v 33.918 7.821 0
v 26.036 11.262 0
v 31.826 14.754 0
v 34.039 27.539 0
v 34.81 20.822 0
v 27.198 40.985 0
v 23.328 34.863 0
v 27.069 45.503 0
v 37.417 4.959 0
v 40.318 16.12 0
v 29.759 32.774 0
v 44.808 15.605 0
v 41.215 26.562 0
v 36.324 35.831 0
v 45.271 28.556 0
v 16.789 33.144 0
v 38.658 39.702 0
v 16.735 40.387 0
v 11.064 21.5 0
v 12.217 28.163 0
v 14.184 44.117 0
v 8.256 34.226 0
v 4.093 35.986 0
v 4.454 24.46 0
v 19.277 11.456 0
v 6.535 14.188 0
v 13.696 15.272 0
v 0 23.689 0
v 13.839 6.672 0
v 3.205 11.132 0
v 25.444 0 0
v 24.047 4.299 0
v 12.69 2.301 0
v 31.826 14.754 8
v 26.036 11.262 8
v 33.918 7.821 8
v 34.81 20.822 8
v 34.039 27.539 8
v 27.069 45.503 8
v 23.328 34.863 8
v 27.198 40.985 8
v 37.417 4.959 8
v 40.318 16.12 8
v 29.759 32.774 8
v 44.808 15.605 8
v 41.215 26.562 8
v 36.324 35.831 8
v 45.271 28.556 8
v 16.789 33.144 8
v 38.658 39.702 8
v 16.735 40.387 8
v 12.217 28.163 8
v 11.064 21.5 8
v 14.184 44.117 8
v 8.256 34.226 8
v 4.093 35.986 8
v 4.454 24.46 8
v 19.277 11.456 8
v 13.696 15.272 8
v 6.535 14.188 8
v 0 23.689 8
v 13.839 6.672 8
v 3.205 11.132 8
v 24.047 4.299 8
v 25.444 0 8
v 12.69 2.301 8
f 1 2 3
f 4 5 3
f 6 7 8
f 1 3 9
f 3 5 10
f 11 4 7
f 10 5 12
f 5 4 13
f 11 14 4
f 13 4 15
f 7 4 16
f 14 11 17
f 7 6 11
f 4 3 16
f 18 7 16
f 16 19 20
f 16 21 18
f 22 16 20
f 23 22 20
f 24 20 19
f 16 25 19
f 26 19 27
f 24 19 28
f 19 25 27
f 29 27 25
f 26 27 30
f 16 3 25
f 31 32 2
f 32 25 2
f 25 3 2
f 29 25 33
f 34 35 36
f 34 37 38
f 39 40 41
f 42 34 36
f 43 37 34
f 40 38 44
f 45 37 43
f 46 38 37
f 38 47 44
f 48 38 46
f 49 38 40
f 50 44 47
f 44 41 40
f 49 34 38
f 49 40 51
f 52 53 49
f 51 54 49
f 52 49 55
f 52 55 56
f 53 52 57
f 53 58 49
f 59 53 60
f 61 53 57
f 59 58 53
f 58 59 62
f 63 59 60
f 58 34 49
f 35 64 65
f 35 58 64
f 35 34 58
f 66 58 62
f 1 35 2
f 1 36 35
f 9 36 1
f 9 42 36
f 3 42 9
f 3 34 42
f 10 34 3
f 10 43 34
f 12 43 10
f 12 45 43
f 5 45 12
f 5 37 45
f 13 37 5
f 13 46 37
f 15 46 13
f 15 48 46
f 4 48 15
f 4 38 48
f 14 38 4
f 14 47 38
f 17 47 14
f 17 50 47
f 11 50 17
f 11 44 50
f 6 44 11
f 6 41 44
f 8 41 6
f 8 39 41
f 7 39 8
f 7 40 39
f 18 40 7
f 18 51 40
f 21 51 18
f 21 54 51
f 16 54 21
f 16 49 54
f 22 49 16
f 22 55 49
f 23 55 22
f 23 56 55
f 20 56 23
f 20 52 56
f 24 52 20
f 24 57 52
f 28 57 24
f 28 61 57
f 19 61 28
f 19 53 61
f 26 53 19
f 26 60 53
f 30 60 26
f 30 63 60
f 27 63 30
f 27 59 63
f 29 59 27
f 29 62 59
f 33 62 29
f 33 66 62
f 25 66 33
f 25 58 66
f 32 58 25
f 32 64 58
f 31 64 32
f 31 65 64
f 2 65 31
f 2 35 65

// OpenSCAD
$fn = 32;

// ----------------------------------------------------------------------
// Fan rotor section: 11 blades, 12 mm hub radius, 11 mm blades
// ----------------------------------------------------------------------

// --- parameters (mm) ---
profile_height = 8;       // extrusion height
profile_points = 33;      // points of the closed outline

profile = [[34.81, 20.822], [41.215, 26.562], [45.271, 28.556], [34.039, 27.539], [36.324, 35.831], [38.658, 39.702], [29.759, 32.774], [27.198, 40.985], [27.069, 45.503], [23.328, 34.863], [16.735, 40.387], [14.184, 44.117], [16.789, 33.144], [8.256, 34.226], [4.093, 35.986], [12.217, 28.163], [4.454, 24.46], [0, 23.689], [11.064, 21.5], [6.535, 14.188], [3.205, 11.132], [13.696, 15.272], [13.839, 6.672], [12.69, 2.301], [19.277, 11.456], [24.047, 4.299], [25.444, 0], [26.036, 11.262], [33.918, 7.821], [37.417, 4.959], [31.826, 14.754], [40.318, 16.12], [44.808, 15.605]];  // single closed polygon, 33 points, counter clockwise

// --- the one profile operation ---
linear_extrude(height = profile_height) polygon(points = profile);
